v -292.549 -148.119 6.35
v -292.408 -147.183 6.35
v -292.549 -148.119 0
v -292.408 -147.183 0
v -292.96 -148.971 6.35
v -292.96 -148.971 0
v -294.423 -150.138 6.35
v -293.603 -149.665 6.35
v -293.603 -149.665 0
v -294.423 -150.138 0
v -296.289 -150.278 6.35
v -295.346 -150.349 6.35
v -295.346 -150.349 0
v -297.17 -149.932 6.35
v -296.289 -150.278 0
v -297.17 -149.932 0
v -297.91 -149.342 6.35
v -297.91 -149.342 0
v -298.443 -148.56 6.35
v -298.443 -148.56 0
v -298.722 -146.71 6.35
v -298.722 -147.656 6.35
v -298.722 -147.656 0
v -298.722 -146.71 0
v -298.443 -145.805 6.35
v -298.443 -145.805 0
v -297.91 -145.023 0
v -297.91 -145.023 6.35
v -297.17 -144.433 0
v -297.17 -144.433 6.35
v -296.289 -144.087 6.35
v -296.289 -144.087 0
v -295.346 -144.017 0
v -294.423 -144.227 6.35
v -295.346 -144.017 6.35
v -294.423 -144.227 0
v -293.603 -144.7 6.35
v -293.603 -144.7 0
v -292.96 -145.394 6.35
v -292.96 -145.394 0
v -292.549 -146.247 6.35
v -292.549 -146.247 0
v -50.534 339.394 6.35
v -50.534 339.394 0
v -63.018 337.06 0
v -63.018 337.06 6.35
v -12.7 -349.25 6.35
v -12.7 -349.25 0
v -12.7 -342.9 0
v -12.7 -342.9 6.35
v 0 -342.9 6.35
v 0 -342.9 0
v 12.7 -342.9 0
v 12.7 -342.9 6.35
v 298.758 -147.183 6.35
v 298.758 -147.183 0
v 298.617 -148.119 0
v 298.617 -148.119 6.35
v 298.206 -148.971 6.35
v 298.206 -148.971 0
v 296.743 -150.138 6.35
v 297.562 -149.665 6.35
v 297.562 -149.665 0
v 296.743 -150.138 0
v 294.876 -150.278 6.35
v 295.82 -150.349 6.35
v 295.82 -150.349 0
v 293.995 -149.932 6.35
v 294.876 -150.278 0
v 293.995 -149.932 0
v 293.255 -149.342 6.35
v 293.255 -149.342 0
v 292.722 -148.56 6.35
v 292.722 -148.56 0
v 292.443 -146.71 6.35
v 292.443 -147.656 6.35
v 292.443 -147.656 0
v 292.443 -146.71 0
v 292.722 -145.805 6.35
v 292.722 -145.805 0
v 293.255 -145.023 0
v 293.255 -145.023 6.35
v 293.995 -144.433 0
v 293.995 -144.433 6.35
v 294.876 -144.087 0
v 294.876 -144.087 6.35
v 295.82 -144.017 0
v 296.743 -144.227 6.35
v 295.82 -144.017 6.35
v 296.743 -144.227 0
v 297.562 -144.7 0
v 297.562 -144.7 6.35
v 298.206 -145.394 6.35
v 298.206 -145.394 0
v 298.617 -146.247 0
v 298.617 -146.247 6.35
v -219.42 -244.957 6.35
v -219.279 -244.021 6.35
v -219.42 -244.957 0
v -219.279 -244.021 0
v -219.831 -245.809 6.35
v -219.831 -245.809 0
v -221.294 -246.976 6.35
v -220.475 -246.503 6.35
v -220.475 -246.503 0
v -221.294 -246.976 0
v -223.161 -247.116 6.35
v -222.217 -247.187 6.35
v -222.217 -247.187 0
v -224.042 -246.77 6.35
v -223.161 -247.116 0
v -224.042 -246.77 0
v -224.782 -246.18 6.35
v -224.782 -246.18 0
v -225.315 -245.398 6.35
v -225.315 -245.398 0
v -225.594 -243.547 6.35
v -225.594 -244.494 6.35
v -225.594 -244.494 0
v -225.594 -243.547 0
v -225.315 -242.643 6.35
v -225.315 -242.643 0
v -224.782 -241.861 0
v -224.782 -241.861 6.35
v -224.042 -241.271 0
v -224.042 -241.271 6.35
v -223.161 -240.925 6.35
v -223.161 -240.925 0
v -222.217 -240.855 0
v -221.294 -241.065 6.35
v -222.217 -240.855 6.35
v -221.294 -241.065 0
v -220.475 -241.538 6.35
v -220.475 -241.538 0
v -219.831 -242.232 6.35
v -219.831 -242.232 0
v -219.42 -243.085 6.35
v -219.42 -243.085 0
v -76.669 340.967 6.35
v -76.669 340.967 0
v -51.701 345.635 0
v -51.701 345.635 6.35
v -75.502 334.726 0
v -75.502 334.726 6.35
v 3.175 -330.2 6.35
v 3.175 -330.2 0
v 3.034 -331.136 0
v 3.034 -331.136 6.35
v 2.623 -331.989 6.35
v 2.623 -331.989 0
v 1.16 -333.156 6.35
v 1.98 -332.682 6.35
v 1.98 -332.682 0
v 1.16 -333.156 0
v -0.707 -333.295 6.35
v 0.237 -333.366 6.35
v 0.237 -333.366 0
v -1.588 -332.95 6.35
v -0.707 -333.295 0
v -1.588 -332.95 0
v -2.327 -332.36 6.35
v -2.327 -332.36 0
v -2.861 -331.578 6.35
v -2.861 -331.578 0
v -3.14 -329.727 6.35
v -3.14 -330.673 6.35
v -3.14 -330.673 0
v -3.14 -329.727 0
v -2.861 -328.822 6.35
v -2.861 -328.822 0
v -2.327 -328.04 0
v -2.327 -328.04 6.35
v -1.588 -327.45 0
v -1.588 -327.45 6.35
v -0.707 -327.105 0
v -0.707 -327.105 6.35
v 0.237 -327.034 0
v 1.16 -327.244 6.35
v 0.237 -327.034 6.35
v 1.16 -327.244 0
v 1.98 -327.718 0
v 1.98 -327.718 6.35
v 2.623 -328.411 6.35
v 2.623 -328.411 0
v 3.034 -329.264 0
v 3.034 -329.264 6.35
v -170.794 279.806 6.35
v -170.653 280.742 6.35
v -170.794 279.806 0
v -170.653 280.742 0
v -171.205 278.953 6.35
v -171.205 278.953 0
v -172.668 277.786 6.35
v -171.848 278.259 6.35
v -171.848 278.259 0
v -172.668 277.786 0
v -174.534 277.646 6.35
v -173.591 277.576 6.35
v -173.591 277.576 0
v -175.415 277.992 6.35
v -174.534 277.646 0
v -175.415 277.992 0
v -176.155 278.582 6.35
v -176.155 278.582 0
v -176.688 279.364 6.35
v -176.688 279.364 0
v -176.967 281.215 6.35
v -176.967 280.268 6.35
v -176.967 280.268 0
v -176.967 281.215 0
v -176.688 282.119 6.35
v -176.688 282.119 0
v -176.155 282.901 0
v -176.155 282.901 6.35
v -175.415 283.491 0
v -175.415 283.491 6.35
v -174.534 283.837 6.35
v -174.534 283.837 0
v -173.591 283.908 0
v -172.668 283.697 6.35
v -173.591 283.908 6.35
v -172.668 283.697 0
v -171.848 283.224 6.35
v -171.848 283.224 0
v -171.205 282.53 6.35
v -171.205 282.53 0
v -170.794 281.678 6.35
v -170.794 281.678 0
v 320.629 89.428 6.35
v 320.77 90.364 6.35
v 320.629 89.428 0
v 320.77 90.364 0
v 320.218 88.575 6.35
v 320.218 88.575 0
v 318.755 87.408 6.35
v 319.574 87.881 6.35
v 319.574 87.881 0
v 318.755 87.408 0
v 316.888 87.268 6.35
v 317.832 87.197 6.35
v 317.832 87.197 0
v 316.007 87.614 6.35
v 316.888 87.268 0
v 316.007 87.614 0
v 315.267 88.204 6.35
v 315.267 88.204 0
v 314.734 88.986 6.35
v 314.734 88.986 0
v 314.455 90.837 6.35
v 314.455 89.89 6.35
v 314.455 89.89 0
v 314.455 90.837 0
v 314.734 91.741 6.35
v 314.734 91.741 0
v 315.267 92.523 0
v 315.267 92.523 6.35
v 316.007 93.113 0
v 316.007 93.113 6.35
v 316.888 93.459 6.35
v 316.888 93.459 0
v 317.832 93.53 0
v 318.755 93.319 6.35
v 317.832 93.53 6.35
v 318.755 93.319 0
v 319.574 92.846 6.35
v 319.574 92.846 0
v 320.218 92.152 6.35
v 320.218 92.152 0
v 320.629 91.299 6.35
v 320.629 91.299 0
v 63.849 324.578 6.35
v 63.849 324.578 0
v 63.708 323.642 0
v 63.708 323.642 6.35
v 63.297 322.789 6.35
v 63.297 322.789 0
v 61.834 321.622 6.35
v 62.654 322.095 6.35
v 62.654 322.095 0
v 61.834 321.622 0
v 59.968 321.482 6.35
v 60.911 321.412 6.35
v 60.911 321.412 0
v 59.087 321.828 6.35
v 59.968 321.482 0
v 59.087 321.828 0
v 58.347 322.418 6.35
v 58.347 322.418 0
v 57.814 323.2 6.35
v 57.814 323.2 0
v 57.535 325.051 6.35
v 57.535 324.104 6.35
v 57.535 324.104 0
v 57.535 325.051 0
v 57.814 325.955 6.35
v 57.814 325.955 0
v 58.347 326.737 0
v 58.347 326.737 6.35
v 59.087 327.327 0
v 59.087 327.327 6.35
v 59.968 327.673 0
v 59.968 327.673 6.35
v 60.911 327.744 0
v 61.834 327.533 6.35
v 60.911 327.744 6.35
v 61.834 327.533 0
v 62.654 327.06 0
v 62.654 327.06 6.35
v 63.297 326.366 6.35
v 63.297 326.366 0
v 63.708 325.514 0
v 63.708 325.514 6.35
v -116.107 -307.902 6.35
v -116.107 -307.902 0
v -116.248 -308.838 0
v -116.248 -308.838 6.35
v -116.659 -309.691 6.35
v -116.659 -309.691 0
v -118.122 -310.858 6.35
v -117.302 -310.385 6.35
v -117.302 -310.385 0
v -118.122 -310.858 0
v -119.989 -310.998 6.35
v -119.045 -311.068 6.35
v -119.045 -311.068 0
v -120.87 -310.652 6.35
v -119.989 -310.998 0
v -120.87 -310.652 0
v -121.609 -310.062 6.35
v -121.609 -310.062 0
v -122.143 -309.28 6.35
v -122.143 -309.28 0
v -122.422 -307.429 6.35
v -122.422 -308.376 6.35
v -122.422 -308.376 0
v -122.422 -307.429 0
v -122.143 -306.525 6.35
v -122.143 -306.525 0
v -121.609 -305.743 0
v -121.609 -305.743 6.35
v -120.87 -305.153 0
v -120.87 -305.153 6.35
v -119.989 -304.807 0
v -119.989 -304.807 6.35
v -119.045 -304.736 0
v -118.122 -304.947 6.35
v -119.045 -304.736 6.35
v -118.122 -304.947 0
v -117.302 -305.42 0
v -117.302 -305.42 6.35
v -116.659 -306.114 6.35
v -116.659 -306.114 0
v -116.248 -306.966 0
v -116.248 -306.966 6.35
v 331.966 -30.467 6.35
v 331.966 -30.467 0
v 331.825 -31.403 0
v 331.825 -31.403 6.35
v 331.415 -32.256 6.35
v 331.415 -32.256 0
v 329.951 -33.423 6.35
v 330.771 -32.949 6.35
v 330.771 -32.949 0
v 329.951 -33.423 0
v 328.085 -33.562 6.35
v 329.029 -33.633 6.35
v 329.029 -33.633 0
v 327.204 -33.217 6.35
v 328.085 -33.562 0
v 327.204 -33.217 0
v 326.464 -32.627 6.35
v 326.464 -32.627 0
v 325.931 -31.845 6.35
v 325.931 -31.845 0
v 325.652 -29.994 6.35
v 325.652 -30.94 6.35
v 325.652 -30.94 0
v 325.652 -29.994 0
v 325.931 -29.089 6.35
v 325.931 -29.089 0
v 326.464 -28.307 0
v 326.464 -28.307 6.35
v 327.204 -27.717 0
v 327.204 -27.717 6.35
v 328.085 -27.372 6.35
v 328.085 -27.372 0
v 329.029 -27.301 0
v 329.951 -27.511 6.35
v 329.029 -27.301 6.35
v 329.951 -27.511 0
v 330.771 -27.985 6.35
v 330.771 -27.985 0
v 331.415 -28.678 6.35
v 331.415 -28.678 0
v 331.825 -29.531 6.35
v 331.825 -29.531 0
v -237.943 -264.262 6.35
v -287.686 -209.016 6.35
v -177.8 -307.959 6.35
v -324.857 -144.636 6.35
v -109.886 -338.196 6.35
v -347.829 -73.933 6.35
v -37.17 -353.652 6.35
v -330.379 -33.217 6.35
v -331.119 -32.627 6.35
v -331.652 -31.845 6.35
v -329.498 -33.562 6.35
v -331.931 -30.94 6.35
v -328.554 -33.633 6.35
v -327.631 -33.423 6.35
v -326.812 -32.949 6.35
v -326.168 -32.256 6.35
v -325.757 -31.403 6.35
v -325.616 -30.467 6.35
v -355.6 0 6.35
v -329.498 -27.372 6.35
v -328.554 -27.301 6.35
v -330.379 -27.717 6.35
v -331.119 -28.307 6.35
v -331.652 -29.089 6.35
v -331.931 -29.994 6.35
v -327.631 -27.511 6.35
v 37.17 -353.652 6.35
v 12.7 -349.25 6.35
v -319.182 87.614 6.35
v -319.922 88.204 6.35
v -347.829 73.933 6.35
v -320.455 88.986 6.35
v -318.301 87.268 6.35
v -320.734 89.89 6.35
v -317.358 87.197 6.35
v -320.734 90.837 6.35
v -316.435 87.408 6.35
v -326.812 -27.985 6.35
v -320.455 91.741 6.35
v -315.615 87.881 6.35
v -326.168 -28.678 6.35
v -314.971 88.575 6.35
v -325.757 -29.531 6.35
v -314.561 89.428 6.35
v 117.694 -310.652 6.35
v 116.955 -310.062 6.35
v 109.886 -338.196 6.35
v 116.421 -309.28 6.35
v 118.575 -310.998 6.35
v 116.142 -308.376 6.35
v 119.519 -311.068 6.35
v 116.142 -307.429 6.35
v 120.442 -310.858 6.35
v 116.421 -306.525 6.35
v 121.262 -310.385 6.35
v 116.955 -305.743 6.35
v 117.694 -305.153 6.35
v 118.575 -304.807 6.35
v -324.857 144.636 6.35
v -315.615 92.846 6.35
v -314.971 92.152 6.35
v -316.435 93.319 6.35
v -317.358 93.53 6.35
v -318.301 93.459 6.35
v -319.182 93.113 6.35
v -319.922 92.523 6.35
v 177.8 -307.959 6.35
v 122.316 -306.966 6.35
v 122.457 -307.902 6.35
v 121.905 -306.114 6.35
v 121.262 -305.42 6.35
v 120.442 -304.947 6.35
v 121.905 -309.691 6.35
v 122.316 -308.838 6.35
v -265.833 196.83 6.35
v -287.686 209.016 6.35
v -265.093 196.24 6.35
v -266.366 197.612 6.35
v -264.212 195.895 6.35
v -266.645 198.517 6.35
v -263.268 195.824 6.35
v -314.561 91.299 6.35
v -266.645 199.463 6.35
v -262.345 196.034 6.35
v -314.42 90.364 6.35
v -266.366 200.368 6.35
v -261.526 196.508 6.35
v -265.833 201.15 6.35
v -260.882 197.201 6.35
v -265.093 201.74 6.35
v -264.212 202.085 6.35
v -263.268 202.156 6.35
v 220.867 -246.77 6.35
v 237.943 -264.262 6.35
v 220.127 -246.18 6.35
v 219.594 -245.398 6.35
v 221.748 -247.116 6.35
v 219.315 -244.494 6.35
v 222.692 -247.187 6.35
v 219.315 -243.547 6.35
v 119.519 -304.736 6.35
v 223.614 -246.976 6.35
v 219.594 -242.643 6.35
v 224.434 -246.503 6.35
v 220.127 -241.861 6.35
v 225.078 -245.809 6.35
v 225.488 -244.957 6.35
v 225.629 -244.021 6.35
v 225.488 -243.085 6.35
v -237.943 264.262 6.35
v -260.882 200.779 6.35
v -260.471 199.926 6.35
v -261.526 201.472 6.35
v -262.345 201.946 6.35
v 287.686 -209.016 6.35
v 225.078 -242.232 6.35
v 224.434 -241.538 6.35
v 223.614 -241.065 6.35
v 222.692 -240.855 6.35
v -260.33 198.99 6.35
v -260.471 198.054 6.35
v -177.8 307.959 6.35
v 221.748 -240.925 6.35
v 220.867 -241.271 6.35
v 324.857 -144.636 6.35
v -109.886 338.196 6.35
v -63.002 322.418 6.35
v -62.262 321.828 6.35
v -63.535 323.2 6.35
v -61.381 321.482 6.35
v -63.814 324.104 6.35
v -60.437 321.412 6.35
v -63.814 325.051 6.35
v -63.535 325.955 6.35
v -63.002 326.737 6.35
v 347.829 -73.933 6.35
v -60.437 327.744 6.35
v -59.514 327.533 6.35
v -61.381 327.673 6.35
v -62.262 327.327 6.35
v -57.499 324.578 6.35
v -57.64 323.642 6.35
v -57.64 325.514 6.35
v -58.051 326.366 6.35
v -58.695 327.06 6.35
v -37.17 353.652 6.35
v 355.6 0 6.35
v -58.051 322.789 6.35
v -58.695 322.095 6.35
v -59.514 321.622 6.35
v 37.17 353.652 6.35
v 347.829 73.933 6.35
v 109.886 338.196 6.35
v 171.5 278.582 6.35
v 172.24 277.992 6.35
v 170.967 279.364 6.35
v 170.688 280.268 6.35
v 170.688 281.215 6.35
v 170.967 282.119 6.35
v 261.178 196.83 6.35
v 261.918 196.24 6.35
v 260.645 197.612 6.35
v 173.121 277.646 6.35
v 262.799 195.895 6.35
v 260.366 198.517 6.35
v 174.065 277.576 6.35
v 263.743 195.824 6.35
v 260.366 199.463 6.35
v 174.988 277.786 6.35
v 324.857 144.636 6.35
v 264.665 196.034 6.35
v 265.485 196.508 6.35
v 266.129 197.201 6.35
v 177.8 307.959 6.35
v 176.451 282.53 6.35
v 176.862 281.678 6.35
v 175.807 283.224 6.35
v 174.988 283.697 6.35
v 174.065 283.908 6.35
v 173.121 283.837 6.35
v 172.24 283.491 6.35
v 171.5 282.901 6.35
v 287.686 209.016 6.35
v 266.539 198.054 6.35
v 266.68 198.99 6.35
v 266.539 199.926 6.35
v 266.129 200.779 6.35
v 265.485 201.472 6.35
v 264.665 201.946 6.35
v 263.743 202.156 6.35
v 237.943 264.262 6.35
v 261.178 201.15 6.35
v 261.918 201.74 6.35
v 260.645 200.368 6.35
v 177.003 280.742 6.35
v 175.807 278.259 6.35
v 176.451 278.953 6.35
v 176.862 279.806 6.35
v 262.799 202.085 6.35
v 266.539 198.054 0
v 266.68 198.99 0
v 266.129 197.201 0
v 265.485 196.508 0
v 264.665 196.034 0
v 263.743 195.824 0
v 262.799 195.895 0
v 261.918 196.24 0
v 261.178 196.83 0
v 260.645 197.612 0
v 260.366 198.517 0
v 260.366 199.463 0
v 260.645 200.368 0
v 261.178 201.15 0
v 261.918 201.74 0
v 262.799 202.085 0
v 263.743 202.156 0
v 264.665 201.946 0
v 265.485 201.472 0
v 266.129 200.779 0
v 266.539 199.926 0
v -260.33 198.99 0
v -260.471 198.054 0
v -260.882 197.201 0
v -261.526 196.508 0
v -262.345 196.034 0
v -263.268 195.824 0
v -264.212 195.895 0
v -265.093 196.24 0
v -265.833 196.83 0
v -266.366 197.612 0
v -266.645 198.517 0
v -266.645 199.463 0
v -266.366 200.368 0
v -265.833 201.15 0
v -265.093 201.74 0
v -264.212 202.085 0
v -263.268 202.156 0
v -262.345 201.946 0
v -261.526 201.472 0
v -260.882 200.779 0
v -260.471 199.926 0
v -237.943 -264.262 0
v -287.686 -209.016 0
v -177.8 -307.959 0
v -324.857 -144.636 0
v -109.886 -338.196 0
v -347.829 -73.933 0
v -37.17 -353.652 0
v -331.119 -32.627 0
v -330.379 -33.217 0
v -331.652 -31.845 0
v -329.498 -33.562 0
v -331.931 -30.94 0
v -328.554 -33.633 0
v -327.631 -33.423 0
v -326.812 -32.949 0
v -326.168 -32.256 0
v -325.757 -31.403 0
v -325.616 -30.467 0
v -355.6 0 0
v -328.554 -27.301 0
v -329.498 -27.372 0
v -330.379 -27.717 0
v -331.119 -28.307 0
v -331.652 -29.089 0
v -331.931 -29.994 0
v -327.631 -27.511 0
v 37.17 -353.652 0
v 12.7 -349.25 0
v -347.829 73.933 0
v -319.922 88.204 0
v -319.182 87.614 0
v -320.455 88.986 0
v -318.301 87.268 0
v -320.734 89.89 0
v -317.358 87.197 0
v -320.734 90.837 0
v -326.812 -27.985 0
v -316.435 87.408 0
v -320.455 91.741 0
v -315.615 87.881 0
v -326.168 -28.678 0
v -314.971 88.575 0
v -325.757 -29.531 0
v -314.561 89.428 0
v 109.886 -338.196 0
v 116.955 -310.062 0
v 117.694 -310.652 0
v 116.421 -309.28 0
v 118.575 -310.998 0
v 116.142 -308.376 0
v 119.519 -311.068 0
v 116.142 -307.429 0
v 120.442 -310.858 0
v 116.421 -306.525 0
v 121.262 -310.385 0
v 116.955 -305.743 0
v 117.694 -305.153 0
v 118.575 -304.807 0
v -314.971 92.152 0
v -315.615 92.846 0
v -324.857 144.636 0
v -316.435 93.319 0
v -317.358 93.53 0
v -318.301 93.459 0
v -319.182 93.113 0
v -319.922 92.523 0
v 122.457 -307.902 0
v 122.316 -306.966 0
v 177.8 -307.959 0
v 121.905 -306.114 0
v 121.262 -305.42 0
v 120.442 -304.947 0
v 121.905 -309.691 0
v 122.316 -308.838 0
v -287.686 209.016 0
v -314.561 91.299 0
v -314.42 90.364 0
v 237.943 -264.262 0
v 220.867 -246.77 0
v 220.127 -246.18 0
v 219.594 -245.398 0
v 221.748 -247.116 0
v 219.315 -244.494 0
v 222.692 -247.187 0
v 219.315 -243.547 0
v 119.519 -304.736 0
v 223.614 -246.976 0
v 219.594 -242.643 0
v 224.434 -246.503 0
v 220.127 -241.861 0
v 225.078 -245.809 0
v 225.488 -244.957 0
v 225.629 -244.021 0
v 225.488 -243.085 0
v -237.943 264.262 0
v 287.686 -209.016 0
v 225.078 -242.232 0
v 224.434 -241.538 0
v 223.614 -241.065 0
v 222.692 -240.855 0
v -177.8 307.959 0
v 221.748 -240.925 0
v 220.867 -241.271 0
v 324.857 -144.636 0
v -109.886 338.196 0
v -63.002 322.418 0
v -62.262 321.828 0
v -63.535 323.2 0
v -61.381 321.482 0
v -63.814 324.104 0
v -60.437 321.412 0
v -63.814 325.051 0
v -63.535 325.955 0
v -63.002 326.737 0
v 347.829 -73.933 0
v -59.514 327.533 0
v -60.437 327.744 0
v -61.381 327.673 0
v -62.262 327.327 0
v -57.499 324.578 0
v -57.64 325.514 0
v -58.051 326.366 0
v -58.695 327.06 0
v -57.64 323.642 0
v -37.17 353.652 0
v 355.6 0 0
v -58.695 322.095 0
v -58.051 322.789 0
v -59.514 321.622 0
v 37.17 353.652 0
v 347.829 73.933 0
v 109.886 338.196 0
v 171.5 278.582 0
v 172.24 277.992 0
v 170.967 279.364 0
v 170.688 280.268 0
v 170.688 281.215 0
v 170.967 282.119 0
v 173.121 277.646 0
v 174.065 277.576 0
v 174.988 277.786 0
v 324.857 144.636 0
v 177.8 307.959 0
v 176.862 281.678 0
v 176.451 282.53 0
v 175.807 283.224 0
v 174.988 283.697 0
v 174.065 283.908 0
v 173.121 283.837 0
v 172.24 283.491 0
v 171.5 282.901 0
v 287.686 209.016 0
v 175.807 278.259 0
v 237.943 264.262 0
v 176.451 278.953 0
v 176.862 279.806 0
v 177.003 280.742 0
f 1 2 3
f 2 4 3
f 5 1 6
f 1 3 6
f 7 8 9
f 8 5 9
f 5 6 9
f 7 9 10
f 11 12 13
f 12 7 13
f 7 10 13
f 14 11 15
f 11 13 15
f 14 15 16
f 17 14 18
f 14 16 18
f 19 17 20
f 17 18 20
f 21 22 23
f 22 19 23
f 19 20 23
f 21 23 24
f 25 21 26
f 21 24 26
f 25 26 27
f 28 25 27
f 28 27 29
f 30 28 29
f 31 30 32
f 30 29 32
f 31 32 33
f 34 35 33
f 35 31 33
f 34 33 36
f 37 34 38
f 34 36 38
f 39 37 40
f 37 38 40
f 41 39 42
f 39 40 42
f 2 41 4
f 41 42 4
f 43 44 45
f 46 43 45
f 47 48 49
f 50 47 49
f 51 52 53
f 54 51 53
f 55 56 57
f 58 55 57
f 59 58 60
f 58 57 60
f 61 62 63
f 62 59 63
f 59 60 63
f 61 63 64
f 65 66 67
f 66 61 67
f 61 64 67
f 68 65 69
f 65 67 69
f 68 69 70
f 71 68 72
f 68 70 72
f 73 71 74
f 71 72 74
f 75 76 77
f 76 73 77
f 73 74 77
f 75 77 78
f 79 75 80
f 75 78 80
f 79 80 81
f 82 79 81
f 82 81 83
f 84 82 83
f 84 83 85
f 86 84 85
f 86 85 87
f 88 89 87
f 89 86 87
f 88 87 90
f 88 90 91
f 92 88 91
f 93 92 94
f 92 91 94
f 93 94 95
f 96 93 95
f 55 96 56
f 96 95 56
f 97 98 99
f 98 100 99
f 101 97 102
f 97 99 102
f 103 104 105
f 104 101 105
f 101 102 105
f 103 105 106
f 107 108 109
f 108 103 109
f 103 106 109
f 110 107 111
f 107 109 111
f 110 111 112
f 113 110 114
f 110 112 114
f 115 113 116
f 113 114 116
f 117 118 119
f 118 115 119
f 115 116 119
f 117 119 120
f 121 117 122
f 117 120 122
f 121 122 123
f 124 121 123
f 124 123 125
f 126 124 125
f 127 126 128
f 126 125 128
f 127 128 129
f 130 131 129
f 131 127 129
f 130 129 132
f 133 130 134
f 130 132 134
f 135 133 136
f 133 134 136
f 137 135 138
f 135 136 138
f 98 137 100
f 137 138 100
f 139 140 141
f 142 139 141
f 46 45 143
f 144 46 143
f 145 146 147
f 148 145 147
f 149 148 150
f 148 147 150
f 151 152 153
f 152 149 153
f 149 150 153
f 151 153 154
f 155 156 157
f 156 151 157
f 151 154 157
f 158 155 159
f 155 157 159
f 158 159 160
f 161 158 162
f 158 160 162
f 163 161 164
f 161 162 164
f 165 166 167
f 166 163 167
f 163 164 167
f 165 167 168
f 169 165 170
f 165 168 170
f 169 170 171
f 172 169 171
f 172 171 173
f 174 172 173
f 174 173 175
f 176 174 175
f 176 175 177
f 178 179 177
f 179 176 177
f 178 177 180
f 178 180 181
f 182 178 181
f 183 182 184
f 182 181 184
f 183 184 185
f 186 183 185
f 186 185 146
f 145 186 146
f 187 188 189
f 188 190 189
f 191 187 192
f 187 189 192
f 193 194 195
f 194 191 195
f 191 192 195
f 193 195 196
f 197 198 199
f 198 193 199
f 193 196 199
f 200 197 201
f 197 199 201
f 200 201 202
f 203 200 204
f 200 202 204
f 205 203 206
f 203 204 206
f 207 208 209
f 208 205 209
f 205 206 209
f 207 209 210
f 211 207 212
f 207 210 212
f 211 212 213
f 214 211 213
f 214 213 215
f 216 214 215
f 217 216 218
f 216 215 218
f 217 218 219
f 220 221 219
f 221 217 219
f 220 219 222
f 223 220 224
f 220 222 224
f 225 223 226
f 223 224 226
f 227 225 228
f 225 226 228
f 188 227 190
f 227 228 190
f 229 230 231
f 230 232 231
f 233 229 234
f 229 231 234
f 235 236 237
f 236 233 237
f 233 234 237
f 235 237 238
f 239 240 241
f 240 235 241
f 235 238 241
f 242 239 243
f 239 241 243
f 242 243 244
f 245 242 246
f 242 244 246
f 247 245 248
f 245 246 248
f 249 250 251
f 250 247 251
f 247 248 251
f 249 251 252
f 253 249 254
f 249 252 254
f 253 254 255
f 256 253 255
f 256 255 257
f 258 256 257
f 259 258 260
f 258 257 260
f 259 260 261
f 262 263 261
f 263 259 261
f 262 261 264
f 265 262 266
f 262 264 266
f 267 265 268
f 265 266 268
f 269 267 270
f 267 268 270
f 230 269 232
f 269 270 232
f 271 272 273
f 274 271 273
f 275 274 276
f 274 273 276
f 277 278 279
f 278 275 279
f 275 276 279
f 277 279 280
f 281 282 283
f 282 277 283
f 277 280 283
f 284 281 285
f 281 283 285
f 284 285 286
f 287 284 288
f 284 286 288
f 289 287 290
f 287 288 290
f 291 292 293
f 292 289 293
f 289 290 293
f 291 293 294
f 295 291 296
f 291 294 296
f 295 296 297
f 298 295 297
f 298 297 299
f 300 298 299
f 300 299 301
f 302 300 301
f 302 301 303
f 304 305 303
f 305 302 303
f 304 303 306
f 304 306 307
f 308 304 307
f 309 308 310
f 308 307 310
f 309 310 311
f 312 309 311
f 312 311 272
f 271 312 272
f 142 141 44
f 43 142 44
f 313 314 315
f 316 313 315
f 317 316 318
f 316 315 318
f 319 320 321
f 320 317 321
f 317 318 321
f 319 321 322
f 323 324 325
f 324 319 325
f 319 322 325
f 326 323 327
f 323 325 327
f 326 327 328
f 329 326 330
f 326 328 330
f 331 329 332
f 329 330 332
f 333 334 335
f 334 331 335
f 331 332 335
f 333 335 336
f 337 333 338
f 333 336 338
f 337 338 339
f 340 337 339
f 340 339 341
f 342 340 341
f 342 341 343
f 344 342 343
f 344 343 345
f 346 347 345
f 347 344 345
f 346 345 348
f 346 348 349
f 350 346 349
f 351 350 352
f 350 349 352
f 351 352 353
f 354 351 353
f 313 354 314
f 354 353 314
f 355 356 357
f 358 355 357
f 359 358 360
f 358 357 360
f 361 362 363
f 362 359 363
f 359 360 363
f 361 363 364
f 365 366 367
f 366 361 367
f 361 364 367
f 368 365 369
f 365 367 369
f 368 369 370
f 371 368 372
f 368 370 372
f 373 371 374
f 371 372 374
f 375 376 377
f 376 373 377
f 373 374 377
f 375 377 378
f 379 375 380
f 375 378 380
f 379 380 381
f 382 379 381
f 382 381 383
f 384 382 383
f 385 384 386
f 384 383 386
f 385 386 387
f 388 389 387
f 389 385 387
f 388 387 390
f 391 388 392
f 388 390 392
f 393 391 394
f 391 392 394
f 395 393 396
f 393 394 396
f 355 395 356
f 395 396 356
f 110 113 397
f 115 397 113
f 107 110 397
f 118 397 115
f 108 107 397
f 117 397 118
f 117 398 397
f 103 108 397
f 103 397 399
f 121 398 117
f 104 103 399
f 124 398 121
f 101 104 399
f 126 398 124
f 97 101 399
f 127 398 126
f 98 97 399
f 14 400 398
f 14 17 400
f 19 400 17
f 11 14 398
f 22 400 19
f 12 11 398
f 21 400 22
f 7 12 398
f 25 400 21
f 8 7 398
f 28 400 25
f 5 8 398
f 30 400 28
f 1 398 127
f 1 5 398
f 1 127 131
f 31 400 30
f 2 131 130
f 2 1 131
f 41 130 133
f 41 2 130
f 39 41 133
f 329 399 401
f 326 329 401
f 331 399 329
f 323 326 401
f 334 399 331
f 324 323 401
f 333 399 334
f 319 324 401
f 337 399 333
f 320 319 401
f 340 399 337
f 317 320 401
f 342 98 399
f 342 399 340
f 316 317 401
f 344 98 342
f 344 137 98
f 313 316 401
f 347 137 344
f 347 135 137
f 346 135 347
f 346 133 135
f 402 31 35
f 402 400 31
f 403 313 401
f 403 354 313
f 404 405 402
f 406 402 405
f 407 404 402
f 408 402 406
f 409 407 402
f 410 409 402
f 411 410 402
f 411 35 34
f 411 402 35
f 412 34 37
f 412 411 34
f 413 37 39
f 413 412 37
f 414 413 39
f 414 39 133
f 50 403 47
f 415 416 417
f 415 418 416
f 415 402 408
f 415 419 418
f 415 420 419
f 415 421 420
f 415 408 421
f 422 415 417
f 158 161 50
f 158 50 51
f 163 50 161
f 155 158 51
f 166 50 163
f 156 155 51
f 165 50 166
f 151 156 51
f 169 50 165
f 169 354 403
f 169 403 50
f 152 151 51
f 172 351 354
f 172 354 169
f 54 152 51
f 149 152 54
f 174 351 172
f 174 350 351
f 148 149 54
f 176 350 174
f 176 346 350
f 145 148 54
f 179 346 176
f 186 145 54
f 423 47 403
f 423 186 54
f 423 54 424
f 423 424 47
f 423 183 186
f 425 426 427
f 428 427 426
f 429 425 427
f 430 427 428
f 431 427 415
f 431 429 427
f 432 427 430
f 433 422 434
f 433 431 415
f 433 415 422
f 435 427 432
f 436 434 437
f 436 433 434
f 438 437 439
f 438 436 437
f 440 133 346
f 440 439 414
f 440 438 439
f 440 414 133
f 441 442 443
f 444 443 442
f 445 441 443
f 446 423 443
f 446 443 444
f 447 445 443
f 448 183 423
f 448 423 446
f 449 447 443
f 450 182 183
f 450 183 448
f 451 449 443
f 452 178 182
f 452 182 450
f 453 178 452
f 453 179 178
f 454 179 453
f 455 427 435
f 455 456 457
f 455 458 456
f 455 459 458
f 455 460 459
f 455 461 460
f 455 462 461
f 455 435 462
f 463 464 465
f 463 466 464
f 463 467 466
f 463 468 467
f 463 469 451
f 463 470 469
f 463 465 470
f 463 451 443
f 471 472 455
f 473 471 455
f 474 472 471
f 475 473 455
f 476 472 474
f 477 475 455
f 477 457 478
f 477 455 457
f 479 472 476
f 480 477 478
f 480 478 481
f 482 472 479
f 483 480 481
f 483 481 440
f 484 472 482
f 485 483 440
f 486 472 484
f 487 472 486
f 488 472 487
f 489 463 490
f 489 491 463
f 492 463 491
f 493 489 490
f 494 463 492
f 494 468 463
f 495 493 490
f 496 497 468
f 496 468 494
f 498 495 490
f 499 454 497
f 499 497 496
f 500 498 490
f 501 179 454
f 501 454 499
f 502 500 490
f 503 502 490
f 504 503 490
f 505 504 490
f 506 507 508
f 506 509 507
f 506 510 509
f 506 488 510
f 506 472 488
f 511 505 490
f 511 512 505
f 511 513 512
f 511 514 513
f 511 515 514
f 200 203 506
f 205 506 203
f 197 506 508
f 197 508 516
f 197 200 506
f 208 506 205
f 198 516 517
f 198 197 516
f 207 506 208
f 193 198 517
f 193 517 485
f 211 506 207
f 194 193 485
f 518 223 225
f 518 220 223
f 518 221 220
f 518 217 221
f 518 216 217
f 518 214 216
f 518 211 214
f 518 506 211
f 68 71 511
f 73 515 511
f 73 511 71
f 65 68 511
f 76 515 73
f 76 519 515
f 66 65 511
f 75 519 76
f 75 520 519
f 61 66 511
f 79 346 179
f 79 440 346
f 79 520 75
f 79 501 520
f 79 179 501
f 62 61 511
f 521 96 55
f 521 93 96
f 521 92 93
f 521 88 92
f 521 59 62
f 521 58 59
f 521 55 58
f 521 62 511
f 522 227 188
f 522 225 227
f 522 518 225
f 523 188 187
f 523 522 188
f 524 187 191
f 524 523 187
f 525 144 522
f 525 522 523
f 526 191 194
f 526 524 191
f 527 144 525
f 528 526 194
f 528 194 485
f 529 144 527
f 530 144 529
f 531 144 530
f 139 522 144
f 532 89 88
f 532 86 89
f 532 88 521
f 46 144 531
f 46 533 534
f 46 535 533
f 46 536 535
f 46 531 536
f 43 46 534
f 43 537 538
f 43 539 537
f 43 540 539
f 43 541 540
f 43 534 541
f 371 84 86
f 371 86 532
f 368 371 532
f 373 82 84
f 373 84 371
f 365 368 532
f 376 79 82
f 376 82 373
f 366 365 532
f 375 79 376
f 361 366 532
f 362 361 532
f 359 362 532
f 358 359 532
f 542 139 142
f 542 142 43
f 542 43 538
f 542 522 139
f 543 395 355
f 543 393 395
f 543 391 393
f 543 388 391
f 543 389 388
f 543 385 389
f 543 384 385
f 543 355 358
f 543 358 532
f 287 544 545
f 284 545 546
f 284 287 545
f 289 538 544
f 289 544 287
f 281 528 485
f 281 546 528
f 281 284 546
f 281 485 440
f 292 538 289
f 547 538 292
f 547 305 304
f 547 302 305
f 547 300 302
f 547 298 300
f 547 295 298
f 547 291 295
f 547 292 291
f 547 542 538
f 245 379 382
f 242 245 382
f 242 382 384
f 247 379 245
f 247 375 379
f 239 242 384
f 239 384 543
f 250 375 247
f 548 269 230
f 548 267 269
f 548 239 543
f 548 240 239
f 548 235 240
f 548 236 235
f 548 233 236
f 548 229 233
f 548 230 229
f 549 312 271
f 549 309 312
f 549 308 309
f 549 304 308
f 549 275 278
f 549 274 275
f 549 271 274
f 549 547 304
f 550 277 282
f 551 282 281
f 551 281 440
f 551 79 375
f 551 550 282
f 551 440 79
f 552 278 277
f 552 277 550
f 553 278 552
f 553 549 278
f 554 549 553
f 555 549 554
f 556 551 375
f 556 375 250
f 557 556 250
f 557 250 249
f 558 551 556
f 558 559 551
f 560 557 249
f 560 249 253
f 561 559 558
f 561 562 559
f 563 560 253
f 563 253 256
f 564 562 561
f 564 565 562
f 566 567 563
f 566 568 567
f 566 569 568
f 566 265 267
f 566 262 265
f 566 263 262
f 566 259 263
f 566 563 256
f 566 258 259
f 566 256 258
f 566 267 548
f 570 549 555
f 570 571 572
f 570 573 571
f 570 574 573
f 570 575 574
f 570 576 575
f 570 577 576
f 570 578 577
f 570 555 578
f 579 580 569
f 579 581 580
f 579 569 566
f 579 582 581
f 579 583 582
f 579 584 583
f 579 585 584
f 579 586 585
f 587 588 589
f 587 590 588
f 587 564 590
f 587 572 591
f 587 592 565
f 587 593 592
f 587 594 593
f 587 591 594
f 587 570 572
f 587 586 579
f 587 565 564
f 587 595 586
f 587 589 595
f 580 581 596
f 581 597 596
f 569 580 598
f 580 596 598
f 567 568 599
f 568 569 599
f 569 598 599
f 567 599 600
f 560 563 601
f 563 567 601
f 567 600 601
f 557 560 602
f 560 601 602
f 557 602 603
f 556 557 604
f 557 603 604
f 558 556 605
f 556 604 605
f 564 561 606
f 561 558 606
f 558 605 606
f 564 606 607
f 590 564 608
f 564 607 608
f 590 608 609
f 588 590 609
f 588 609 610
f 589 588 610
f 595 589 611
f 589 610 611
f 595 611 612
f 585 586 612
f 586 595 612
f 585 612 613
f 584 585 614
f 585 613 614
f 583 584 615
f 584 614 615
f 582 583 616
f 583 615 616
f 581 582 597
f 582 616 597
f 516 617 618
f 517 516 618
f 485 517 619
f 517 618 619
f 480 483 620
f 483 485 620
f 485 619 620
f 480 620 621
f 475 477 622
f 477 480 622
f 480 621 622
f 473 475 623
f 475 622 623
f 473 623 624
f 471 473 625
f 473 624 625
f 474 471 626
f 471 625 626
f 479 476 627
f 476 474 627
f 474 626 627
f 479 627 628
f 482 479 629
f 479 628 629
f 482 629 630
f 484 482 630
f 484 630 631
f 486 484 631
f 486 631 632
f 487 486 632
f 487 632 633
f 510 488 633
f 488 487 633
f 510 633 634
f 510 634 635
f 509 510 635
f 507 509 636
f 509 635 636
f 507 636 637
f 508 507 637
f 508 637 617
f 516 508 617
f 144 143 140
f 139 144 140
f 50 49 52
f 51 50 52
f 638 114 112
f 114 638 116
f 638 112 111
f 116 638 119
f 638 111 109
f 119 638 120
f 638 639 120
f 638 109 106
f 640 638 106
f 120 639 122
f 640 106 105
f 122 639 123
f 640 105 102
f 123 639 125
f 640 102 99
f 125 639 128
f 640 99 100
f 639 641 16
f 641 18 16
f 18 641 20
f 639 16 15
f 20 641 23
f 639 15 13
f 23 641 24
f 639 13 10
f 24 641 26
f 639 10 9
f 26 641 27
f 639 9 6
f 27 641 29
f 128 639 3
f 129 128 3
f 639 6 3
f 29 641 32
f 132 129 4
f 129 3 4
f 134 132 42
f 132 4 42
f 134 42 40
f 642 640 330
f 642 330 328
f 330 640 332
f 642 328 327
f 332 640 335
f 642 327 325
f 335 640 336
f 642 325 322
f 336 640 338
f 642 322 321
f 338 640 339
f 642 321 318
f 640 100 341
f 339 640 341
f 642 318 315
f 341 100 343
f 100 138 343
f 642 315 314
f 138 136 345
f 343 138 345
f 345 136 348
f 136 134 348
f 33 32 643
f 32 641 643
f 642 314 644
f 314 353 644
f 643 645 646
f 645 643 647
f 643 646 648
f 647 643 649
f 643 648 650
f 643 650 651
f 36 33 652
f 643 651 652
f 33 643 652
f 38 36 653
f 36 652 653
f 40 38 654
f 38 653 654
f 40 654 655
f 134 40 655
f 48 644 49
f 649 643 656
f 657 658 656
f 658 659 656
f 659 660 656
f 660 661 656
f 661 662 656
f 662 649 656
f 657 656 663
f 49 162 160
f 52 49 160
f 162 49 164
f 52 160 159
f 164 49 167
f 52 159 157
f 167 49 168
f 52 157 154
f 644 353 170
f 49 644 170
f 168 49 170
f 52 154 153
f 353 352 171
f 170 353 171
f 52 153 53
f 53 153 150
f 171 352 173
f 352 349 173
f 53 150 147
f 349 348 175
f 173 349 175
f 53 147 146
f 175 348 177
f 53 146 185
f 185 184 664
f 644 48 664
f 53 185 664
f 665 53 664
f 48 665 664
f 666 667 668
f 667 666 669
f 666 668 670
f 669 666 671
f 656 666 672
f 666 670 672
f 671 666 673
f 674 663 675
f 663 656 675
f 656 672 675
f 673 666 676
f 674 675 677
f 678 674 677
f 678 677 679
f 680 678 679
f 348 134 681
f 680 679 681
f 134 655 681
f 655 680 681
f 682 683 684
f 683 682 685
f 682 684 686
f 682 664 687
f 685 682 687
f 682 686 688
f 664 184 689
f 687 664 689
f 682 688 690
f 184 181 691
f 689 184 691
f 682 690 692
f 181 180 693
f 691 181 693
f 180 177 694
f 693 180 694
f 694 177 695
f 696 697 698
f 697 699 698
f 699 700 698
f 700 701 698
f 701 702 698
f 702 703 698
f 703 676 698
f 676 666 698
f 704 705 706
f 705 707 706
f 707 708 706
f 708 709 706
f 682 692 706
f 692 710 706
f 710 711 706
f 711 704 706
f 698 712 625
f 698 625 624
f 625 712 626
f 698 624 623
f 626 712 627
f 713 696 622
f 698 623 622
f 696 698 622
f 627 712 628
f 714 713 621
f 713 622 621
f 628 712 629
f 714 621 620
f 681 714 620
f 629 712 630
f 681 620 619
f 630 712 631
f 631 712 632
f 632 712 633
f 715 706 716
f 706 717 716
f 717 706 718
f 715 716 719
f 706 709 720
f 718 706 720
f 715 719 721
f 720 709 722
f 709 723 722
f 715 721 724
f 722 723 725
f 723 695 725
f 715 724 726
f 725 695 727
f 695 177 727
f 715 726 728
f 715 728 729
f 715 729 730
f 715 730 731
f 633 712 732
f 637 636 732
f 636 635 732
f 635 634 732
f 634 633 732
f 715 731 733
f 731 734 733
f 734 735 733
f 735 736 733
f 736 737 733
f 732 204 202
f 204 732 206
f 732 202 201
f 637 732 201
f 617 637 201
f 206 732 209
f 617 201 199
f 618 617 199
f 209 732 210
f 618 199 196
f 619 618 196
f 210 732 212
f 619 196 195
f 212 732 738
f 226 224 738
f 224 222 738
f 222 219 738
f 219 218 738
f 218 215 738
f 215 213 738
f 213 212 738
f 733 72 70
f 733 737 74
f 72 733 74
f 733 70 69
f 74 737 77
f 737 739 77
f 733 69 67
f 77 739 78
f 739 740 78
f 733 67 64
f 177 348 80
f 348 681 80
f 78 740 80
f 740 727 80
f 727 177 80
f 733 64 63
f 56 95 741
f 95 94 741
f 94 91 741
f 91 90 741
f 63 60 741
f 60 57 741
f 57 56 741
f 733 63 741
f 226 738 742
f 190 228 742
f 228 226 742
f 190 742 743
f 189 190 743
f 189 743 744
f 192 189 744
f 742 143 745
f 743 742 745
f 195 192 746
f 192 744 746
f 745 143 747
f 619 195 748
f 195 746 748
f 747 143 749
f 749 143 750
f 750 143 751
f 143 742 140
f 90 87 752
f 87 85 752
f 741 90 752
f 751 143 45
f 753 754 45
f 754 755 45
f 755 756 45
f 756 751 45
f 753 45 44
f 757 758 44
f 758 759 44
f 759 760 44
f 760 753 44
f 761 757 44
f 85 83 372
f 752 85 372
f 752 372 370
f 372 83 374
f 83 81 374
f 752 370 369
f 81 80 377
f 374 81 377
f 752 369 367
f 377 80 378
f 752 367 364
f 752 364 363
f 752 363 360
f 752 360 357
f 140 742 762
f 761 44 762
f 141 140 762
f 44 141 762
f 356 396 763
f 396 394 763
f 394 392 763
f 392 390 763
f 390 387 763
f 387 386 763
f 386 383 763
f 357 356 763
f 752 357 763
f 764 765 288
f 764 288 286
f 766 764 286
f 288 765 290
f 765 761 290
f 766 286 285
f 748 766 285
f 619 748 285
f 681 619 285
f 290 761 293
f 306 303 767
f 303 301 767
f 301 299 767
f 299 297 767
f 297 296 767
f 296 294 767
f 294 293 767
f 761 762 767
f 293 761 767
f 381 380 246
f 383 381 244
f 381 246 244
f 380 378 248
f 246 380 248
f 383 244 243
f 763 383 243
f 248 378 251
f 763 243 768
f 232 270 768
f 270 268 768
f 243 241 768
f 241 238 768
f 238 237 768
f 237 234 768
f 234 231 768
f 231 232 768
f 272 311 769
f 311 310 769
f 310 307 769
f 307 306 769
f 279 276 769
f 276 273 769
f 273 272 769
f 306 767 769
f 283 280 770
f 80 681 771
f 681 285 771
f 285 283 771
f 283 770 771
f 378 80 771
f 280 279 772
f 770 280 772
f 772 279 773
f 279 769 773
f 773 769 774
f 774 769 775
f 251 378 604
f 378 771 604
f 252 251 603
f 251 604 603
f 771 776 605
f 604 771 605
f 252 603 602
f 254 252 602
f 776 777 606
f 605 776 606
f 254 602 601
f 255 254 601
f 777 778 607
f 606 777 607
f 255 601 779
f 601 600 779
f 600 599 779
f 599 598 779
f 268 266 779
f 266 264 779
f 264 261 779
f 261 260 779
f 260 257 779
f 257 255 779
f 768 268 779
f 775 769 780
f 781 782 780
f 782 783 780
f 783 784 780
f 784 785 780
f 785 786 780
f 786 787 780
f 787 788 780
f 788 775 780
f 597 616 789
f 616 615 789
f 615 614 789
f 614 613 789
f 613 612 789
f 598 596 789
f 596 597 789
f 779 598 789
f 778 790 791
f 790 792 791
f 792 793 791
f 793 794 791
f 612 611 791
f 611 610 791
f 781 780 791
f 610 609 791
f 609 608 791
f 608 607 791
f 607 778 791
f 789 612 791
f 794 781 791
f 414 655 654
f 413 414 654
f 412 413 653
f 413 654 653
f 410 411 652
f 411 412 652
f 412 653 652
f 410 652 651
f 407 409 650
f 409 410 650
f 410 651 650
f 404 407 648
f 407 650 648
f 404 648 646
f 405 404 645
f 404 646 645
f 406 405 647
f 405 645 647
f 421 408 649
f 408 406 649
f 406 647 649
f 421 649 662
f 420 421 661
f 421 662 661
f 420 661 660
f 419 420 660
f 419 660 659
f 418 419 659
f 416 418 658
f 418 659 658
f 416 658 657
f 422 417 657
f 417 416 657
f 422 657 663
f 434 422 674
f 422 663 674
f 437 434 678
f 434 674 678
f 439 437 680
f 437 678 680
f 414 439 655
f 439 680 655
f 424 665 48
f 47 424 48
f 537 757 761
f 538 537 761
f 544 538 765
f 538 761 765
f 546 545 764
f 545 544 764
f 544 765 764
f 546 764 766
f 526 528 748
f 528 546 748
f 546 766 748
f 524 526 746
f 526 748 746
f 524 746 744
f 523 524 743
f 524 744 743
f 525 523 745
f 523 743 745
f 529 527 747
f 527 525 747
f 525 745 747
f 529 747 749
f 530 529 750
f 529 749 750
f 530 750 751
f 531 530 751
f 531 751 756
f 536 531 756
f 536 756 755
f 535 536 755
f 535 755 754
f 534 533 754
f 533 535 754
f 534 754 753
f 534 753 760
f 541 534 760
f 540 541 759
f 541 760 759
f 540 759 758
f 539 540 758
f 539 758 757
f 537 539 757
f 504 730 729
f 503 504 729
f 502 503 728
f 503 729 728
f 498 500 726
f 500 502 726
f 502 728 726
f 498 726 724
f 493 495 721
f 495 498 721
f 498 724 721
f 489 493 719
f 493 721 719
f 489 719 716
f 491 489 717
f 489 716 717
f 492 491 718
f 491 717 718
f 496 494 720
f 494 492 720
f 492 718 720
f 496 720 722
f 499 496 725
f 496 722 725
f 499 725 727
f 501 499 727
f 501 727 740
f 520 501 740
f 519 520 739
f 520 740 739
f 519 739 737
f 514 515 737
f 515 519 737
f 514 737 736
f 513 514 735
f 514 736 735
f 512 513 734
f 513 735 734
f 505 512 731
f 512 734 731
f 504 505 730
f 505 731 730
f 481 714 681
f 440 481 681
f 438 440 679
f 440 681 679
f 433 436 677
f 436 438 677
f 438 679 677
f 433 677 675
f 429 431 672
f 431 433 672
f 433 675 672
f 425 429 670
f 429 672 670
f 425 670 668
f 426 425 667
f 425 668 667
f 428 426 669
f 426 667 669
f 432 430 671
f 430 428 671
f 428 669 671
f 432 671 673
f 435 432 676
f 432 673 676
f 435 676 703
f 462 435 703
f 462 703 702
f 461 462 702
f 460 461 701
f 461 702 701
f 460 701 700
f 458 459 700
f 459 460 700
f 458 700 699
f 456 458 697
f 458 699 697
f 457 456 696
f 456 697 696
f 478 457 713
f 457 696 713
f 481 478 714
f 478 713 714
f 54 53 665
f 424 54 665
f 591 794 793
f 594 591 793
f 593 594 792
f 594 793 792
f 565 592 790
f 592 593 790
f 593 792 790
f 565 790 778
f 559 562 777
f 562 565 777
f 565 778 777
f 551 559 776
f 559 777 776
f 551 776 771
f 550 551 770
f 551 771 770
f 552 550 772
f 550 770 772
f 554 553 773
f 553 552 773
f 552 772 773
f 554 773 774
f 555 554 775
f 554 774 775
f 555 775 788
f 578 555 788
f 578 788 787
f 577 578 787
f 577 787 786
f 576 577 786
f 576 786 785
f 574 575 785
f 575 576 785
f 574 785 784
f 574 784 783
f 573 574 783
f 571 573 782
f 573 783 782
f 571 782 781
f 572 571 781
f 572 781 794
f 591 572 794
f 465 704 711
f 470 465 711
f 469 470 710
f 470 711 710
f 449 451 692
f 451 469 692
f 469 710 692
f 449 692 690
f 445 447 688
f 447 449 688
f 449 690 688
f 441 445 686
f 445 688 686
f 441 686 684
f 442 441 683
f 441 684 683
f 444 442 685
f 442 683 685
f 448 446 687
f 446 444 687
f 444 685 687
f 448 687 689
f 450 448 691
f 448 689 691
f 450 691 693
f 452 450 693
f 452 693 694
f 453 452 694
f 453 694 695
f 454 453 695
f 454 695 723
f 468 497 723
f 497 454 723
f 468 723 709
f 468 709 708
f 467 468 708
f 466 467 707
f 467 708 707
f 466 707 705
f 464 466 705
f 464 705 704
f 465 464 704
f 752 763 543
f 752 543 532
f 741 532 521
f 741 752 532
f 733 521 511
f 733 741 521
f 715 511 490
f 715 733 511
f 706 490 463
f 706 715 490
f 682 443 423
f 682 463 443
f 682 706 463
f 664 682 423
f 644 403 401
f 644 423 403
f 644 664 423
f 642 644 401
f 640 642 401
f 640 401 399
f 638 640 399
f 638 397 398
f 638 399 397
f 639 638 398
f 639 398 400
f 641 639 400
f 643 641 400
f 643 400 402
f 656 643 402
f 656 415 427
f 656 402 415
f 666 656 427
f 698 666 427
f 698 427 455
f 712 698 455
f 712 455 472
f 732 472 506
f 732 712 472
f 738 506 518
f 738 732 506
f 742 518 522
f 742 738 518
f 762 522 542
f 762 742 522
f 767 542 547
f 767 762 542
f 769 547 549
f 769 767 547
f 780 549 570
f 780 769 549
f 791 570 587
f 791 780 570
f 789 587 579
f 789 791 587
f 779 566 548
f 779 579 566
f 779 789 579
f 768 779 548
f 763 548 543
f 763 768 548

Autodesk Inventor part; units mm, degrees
ref_plane "YZ Plane" through (0, 0, 0) normal (1, 0, 0) x (0, 1, 0)
ref_plane "XZ Plane" through (0, 0, 0) normal (0, 1, 0) x (-1, 0, 0)
ref_plane "XY Plane" through (0, 0, 0) normal (0, 0, 1) x (1, 0, 0)
sketch "Sketch1" plane through (0, 0, 0) normal (0, 0, 1) x (1, 0, 0)
  circle A0 centre (0, 0) radius 355.6
  circle A1 centre (0, -330.2) radius 3.175
  circle A2 centre (119.282, -307.9023) radius 3.175
  circle A3 centre (222.4543, -244.0207) radius 3.175
  circle A4 centre (295.5829, -147.1828) radius 3.175
  circle A5 centre (328.7914, -30.467) radius 3.175
  circle A6 centre (317.5948, 90.3635) radius 3.175
  circle A7 centre (263.5053, 198.99) radius 3.175
  circle A8 centre (173.8279, 280.7417) radius 3.175
  circle A9 centre (60.6741, 324.5777) radius 3.175
  circle A10 centre (-60.6741, 324.5777) radius 3.175
  circle A11 centre (-173.8279, 280.7417) radius 3.175
  circle A12 centre (-263.5053, 198.99) radius 3.175
  circle A13 centre (-317.5948, 90.3635) radius 3.175
  circle A14 centre (-328.7914, -30.467) radius 3.175
  circle A15 centre (-295.5829, -147.1828) radius 3.175
  circle A16 centre (-222.4543, -244.0207) radius 3.175
  circle A17 centre (-119.282, -307.9023) radius 3.175
  line L0 (0, -342.9) -> (12.7, -342.9)
  line L1 (12.7, -342.9) -> (12.7, -349.25)
  line L2 (12.7, -349.25) -> (-12.7, -349.25)
  line L3 (-12.7, -349.25) -> (-12.7, -342.9)
  line L4 (-12.7, -342.9) -> (0, -342.9)
  line L5 (-75.5018, 334.7255) -> (-76.6688, 340.9674)
  line L6 (-63.0181, 337.0595) -> (-75.5018, 334.7255)
  line L7 (-50.5344, 339.3935) -> (-63.0181, 337.0595)
  line L8 (-76.6688, 340.9674) -> (-51.7014, 345.6354)
  line L9 (-51.7014, 345.6354) -> (-50.5344, 339.3935)
  dimension "d0" = 711.2
  dimension "d2" = 6.35
  dimension "d5" = 360
  dimension "d7" = 12.7
  dimension "d8" = 6.35
  dimension "d9" = 25.4
extrude "Extrusion1" add sketch "Sketch1" along normal blind 6.35
properties part number "laser circle3d back"
